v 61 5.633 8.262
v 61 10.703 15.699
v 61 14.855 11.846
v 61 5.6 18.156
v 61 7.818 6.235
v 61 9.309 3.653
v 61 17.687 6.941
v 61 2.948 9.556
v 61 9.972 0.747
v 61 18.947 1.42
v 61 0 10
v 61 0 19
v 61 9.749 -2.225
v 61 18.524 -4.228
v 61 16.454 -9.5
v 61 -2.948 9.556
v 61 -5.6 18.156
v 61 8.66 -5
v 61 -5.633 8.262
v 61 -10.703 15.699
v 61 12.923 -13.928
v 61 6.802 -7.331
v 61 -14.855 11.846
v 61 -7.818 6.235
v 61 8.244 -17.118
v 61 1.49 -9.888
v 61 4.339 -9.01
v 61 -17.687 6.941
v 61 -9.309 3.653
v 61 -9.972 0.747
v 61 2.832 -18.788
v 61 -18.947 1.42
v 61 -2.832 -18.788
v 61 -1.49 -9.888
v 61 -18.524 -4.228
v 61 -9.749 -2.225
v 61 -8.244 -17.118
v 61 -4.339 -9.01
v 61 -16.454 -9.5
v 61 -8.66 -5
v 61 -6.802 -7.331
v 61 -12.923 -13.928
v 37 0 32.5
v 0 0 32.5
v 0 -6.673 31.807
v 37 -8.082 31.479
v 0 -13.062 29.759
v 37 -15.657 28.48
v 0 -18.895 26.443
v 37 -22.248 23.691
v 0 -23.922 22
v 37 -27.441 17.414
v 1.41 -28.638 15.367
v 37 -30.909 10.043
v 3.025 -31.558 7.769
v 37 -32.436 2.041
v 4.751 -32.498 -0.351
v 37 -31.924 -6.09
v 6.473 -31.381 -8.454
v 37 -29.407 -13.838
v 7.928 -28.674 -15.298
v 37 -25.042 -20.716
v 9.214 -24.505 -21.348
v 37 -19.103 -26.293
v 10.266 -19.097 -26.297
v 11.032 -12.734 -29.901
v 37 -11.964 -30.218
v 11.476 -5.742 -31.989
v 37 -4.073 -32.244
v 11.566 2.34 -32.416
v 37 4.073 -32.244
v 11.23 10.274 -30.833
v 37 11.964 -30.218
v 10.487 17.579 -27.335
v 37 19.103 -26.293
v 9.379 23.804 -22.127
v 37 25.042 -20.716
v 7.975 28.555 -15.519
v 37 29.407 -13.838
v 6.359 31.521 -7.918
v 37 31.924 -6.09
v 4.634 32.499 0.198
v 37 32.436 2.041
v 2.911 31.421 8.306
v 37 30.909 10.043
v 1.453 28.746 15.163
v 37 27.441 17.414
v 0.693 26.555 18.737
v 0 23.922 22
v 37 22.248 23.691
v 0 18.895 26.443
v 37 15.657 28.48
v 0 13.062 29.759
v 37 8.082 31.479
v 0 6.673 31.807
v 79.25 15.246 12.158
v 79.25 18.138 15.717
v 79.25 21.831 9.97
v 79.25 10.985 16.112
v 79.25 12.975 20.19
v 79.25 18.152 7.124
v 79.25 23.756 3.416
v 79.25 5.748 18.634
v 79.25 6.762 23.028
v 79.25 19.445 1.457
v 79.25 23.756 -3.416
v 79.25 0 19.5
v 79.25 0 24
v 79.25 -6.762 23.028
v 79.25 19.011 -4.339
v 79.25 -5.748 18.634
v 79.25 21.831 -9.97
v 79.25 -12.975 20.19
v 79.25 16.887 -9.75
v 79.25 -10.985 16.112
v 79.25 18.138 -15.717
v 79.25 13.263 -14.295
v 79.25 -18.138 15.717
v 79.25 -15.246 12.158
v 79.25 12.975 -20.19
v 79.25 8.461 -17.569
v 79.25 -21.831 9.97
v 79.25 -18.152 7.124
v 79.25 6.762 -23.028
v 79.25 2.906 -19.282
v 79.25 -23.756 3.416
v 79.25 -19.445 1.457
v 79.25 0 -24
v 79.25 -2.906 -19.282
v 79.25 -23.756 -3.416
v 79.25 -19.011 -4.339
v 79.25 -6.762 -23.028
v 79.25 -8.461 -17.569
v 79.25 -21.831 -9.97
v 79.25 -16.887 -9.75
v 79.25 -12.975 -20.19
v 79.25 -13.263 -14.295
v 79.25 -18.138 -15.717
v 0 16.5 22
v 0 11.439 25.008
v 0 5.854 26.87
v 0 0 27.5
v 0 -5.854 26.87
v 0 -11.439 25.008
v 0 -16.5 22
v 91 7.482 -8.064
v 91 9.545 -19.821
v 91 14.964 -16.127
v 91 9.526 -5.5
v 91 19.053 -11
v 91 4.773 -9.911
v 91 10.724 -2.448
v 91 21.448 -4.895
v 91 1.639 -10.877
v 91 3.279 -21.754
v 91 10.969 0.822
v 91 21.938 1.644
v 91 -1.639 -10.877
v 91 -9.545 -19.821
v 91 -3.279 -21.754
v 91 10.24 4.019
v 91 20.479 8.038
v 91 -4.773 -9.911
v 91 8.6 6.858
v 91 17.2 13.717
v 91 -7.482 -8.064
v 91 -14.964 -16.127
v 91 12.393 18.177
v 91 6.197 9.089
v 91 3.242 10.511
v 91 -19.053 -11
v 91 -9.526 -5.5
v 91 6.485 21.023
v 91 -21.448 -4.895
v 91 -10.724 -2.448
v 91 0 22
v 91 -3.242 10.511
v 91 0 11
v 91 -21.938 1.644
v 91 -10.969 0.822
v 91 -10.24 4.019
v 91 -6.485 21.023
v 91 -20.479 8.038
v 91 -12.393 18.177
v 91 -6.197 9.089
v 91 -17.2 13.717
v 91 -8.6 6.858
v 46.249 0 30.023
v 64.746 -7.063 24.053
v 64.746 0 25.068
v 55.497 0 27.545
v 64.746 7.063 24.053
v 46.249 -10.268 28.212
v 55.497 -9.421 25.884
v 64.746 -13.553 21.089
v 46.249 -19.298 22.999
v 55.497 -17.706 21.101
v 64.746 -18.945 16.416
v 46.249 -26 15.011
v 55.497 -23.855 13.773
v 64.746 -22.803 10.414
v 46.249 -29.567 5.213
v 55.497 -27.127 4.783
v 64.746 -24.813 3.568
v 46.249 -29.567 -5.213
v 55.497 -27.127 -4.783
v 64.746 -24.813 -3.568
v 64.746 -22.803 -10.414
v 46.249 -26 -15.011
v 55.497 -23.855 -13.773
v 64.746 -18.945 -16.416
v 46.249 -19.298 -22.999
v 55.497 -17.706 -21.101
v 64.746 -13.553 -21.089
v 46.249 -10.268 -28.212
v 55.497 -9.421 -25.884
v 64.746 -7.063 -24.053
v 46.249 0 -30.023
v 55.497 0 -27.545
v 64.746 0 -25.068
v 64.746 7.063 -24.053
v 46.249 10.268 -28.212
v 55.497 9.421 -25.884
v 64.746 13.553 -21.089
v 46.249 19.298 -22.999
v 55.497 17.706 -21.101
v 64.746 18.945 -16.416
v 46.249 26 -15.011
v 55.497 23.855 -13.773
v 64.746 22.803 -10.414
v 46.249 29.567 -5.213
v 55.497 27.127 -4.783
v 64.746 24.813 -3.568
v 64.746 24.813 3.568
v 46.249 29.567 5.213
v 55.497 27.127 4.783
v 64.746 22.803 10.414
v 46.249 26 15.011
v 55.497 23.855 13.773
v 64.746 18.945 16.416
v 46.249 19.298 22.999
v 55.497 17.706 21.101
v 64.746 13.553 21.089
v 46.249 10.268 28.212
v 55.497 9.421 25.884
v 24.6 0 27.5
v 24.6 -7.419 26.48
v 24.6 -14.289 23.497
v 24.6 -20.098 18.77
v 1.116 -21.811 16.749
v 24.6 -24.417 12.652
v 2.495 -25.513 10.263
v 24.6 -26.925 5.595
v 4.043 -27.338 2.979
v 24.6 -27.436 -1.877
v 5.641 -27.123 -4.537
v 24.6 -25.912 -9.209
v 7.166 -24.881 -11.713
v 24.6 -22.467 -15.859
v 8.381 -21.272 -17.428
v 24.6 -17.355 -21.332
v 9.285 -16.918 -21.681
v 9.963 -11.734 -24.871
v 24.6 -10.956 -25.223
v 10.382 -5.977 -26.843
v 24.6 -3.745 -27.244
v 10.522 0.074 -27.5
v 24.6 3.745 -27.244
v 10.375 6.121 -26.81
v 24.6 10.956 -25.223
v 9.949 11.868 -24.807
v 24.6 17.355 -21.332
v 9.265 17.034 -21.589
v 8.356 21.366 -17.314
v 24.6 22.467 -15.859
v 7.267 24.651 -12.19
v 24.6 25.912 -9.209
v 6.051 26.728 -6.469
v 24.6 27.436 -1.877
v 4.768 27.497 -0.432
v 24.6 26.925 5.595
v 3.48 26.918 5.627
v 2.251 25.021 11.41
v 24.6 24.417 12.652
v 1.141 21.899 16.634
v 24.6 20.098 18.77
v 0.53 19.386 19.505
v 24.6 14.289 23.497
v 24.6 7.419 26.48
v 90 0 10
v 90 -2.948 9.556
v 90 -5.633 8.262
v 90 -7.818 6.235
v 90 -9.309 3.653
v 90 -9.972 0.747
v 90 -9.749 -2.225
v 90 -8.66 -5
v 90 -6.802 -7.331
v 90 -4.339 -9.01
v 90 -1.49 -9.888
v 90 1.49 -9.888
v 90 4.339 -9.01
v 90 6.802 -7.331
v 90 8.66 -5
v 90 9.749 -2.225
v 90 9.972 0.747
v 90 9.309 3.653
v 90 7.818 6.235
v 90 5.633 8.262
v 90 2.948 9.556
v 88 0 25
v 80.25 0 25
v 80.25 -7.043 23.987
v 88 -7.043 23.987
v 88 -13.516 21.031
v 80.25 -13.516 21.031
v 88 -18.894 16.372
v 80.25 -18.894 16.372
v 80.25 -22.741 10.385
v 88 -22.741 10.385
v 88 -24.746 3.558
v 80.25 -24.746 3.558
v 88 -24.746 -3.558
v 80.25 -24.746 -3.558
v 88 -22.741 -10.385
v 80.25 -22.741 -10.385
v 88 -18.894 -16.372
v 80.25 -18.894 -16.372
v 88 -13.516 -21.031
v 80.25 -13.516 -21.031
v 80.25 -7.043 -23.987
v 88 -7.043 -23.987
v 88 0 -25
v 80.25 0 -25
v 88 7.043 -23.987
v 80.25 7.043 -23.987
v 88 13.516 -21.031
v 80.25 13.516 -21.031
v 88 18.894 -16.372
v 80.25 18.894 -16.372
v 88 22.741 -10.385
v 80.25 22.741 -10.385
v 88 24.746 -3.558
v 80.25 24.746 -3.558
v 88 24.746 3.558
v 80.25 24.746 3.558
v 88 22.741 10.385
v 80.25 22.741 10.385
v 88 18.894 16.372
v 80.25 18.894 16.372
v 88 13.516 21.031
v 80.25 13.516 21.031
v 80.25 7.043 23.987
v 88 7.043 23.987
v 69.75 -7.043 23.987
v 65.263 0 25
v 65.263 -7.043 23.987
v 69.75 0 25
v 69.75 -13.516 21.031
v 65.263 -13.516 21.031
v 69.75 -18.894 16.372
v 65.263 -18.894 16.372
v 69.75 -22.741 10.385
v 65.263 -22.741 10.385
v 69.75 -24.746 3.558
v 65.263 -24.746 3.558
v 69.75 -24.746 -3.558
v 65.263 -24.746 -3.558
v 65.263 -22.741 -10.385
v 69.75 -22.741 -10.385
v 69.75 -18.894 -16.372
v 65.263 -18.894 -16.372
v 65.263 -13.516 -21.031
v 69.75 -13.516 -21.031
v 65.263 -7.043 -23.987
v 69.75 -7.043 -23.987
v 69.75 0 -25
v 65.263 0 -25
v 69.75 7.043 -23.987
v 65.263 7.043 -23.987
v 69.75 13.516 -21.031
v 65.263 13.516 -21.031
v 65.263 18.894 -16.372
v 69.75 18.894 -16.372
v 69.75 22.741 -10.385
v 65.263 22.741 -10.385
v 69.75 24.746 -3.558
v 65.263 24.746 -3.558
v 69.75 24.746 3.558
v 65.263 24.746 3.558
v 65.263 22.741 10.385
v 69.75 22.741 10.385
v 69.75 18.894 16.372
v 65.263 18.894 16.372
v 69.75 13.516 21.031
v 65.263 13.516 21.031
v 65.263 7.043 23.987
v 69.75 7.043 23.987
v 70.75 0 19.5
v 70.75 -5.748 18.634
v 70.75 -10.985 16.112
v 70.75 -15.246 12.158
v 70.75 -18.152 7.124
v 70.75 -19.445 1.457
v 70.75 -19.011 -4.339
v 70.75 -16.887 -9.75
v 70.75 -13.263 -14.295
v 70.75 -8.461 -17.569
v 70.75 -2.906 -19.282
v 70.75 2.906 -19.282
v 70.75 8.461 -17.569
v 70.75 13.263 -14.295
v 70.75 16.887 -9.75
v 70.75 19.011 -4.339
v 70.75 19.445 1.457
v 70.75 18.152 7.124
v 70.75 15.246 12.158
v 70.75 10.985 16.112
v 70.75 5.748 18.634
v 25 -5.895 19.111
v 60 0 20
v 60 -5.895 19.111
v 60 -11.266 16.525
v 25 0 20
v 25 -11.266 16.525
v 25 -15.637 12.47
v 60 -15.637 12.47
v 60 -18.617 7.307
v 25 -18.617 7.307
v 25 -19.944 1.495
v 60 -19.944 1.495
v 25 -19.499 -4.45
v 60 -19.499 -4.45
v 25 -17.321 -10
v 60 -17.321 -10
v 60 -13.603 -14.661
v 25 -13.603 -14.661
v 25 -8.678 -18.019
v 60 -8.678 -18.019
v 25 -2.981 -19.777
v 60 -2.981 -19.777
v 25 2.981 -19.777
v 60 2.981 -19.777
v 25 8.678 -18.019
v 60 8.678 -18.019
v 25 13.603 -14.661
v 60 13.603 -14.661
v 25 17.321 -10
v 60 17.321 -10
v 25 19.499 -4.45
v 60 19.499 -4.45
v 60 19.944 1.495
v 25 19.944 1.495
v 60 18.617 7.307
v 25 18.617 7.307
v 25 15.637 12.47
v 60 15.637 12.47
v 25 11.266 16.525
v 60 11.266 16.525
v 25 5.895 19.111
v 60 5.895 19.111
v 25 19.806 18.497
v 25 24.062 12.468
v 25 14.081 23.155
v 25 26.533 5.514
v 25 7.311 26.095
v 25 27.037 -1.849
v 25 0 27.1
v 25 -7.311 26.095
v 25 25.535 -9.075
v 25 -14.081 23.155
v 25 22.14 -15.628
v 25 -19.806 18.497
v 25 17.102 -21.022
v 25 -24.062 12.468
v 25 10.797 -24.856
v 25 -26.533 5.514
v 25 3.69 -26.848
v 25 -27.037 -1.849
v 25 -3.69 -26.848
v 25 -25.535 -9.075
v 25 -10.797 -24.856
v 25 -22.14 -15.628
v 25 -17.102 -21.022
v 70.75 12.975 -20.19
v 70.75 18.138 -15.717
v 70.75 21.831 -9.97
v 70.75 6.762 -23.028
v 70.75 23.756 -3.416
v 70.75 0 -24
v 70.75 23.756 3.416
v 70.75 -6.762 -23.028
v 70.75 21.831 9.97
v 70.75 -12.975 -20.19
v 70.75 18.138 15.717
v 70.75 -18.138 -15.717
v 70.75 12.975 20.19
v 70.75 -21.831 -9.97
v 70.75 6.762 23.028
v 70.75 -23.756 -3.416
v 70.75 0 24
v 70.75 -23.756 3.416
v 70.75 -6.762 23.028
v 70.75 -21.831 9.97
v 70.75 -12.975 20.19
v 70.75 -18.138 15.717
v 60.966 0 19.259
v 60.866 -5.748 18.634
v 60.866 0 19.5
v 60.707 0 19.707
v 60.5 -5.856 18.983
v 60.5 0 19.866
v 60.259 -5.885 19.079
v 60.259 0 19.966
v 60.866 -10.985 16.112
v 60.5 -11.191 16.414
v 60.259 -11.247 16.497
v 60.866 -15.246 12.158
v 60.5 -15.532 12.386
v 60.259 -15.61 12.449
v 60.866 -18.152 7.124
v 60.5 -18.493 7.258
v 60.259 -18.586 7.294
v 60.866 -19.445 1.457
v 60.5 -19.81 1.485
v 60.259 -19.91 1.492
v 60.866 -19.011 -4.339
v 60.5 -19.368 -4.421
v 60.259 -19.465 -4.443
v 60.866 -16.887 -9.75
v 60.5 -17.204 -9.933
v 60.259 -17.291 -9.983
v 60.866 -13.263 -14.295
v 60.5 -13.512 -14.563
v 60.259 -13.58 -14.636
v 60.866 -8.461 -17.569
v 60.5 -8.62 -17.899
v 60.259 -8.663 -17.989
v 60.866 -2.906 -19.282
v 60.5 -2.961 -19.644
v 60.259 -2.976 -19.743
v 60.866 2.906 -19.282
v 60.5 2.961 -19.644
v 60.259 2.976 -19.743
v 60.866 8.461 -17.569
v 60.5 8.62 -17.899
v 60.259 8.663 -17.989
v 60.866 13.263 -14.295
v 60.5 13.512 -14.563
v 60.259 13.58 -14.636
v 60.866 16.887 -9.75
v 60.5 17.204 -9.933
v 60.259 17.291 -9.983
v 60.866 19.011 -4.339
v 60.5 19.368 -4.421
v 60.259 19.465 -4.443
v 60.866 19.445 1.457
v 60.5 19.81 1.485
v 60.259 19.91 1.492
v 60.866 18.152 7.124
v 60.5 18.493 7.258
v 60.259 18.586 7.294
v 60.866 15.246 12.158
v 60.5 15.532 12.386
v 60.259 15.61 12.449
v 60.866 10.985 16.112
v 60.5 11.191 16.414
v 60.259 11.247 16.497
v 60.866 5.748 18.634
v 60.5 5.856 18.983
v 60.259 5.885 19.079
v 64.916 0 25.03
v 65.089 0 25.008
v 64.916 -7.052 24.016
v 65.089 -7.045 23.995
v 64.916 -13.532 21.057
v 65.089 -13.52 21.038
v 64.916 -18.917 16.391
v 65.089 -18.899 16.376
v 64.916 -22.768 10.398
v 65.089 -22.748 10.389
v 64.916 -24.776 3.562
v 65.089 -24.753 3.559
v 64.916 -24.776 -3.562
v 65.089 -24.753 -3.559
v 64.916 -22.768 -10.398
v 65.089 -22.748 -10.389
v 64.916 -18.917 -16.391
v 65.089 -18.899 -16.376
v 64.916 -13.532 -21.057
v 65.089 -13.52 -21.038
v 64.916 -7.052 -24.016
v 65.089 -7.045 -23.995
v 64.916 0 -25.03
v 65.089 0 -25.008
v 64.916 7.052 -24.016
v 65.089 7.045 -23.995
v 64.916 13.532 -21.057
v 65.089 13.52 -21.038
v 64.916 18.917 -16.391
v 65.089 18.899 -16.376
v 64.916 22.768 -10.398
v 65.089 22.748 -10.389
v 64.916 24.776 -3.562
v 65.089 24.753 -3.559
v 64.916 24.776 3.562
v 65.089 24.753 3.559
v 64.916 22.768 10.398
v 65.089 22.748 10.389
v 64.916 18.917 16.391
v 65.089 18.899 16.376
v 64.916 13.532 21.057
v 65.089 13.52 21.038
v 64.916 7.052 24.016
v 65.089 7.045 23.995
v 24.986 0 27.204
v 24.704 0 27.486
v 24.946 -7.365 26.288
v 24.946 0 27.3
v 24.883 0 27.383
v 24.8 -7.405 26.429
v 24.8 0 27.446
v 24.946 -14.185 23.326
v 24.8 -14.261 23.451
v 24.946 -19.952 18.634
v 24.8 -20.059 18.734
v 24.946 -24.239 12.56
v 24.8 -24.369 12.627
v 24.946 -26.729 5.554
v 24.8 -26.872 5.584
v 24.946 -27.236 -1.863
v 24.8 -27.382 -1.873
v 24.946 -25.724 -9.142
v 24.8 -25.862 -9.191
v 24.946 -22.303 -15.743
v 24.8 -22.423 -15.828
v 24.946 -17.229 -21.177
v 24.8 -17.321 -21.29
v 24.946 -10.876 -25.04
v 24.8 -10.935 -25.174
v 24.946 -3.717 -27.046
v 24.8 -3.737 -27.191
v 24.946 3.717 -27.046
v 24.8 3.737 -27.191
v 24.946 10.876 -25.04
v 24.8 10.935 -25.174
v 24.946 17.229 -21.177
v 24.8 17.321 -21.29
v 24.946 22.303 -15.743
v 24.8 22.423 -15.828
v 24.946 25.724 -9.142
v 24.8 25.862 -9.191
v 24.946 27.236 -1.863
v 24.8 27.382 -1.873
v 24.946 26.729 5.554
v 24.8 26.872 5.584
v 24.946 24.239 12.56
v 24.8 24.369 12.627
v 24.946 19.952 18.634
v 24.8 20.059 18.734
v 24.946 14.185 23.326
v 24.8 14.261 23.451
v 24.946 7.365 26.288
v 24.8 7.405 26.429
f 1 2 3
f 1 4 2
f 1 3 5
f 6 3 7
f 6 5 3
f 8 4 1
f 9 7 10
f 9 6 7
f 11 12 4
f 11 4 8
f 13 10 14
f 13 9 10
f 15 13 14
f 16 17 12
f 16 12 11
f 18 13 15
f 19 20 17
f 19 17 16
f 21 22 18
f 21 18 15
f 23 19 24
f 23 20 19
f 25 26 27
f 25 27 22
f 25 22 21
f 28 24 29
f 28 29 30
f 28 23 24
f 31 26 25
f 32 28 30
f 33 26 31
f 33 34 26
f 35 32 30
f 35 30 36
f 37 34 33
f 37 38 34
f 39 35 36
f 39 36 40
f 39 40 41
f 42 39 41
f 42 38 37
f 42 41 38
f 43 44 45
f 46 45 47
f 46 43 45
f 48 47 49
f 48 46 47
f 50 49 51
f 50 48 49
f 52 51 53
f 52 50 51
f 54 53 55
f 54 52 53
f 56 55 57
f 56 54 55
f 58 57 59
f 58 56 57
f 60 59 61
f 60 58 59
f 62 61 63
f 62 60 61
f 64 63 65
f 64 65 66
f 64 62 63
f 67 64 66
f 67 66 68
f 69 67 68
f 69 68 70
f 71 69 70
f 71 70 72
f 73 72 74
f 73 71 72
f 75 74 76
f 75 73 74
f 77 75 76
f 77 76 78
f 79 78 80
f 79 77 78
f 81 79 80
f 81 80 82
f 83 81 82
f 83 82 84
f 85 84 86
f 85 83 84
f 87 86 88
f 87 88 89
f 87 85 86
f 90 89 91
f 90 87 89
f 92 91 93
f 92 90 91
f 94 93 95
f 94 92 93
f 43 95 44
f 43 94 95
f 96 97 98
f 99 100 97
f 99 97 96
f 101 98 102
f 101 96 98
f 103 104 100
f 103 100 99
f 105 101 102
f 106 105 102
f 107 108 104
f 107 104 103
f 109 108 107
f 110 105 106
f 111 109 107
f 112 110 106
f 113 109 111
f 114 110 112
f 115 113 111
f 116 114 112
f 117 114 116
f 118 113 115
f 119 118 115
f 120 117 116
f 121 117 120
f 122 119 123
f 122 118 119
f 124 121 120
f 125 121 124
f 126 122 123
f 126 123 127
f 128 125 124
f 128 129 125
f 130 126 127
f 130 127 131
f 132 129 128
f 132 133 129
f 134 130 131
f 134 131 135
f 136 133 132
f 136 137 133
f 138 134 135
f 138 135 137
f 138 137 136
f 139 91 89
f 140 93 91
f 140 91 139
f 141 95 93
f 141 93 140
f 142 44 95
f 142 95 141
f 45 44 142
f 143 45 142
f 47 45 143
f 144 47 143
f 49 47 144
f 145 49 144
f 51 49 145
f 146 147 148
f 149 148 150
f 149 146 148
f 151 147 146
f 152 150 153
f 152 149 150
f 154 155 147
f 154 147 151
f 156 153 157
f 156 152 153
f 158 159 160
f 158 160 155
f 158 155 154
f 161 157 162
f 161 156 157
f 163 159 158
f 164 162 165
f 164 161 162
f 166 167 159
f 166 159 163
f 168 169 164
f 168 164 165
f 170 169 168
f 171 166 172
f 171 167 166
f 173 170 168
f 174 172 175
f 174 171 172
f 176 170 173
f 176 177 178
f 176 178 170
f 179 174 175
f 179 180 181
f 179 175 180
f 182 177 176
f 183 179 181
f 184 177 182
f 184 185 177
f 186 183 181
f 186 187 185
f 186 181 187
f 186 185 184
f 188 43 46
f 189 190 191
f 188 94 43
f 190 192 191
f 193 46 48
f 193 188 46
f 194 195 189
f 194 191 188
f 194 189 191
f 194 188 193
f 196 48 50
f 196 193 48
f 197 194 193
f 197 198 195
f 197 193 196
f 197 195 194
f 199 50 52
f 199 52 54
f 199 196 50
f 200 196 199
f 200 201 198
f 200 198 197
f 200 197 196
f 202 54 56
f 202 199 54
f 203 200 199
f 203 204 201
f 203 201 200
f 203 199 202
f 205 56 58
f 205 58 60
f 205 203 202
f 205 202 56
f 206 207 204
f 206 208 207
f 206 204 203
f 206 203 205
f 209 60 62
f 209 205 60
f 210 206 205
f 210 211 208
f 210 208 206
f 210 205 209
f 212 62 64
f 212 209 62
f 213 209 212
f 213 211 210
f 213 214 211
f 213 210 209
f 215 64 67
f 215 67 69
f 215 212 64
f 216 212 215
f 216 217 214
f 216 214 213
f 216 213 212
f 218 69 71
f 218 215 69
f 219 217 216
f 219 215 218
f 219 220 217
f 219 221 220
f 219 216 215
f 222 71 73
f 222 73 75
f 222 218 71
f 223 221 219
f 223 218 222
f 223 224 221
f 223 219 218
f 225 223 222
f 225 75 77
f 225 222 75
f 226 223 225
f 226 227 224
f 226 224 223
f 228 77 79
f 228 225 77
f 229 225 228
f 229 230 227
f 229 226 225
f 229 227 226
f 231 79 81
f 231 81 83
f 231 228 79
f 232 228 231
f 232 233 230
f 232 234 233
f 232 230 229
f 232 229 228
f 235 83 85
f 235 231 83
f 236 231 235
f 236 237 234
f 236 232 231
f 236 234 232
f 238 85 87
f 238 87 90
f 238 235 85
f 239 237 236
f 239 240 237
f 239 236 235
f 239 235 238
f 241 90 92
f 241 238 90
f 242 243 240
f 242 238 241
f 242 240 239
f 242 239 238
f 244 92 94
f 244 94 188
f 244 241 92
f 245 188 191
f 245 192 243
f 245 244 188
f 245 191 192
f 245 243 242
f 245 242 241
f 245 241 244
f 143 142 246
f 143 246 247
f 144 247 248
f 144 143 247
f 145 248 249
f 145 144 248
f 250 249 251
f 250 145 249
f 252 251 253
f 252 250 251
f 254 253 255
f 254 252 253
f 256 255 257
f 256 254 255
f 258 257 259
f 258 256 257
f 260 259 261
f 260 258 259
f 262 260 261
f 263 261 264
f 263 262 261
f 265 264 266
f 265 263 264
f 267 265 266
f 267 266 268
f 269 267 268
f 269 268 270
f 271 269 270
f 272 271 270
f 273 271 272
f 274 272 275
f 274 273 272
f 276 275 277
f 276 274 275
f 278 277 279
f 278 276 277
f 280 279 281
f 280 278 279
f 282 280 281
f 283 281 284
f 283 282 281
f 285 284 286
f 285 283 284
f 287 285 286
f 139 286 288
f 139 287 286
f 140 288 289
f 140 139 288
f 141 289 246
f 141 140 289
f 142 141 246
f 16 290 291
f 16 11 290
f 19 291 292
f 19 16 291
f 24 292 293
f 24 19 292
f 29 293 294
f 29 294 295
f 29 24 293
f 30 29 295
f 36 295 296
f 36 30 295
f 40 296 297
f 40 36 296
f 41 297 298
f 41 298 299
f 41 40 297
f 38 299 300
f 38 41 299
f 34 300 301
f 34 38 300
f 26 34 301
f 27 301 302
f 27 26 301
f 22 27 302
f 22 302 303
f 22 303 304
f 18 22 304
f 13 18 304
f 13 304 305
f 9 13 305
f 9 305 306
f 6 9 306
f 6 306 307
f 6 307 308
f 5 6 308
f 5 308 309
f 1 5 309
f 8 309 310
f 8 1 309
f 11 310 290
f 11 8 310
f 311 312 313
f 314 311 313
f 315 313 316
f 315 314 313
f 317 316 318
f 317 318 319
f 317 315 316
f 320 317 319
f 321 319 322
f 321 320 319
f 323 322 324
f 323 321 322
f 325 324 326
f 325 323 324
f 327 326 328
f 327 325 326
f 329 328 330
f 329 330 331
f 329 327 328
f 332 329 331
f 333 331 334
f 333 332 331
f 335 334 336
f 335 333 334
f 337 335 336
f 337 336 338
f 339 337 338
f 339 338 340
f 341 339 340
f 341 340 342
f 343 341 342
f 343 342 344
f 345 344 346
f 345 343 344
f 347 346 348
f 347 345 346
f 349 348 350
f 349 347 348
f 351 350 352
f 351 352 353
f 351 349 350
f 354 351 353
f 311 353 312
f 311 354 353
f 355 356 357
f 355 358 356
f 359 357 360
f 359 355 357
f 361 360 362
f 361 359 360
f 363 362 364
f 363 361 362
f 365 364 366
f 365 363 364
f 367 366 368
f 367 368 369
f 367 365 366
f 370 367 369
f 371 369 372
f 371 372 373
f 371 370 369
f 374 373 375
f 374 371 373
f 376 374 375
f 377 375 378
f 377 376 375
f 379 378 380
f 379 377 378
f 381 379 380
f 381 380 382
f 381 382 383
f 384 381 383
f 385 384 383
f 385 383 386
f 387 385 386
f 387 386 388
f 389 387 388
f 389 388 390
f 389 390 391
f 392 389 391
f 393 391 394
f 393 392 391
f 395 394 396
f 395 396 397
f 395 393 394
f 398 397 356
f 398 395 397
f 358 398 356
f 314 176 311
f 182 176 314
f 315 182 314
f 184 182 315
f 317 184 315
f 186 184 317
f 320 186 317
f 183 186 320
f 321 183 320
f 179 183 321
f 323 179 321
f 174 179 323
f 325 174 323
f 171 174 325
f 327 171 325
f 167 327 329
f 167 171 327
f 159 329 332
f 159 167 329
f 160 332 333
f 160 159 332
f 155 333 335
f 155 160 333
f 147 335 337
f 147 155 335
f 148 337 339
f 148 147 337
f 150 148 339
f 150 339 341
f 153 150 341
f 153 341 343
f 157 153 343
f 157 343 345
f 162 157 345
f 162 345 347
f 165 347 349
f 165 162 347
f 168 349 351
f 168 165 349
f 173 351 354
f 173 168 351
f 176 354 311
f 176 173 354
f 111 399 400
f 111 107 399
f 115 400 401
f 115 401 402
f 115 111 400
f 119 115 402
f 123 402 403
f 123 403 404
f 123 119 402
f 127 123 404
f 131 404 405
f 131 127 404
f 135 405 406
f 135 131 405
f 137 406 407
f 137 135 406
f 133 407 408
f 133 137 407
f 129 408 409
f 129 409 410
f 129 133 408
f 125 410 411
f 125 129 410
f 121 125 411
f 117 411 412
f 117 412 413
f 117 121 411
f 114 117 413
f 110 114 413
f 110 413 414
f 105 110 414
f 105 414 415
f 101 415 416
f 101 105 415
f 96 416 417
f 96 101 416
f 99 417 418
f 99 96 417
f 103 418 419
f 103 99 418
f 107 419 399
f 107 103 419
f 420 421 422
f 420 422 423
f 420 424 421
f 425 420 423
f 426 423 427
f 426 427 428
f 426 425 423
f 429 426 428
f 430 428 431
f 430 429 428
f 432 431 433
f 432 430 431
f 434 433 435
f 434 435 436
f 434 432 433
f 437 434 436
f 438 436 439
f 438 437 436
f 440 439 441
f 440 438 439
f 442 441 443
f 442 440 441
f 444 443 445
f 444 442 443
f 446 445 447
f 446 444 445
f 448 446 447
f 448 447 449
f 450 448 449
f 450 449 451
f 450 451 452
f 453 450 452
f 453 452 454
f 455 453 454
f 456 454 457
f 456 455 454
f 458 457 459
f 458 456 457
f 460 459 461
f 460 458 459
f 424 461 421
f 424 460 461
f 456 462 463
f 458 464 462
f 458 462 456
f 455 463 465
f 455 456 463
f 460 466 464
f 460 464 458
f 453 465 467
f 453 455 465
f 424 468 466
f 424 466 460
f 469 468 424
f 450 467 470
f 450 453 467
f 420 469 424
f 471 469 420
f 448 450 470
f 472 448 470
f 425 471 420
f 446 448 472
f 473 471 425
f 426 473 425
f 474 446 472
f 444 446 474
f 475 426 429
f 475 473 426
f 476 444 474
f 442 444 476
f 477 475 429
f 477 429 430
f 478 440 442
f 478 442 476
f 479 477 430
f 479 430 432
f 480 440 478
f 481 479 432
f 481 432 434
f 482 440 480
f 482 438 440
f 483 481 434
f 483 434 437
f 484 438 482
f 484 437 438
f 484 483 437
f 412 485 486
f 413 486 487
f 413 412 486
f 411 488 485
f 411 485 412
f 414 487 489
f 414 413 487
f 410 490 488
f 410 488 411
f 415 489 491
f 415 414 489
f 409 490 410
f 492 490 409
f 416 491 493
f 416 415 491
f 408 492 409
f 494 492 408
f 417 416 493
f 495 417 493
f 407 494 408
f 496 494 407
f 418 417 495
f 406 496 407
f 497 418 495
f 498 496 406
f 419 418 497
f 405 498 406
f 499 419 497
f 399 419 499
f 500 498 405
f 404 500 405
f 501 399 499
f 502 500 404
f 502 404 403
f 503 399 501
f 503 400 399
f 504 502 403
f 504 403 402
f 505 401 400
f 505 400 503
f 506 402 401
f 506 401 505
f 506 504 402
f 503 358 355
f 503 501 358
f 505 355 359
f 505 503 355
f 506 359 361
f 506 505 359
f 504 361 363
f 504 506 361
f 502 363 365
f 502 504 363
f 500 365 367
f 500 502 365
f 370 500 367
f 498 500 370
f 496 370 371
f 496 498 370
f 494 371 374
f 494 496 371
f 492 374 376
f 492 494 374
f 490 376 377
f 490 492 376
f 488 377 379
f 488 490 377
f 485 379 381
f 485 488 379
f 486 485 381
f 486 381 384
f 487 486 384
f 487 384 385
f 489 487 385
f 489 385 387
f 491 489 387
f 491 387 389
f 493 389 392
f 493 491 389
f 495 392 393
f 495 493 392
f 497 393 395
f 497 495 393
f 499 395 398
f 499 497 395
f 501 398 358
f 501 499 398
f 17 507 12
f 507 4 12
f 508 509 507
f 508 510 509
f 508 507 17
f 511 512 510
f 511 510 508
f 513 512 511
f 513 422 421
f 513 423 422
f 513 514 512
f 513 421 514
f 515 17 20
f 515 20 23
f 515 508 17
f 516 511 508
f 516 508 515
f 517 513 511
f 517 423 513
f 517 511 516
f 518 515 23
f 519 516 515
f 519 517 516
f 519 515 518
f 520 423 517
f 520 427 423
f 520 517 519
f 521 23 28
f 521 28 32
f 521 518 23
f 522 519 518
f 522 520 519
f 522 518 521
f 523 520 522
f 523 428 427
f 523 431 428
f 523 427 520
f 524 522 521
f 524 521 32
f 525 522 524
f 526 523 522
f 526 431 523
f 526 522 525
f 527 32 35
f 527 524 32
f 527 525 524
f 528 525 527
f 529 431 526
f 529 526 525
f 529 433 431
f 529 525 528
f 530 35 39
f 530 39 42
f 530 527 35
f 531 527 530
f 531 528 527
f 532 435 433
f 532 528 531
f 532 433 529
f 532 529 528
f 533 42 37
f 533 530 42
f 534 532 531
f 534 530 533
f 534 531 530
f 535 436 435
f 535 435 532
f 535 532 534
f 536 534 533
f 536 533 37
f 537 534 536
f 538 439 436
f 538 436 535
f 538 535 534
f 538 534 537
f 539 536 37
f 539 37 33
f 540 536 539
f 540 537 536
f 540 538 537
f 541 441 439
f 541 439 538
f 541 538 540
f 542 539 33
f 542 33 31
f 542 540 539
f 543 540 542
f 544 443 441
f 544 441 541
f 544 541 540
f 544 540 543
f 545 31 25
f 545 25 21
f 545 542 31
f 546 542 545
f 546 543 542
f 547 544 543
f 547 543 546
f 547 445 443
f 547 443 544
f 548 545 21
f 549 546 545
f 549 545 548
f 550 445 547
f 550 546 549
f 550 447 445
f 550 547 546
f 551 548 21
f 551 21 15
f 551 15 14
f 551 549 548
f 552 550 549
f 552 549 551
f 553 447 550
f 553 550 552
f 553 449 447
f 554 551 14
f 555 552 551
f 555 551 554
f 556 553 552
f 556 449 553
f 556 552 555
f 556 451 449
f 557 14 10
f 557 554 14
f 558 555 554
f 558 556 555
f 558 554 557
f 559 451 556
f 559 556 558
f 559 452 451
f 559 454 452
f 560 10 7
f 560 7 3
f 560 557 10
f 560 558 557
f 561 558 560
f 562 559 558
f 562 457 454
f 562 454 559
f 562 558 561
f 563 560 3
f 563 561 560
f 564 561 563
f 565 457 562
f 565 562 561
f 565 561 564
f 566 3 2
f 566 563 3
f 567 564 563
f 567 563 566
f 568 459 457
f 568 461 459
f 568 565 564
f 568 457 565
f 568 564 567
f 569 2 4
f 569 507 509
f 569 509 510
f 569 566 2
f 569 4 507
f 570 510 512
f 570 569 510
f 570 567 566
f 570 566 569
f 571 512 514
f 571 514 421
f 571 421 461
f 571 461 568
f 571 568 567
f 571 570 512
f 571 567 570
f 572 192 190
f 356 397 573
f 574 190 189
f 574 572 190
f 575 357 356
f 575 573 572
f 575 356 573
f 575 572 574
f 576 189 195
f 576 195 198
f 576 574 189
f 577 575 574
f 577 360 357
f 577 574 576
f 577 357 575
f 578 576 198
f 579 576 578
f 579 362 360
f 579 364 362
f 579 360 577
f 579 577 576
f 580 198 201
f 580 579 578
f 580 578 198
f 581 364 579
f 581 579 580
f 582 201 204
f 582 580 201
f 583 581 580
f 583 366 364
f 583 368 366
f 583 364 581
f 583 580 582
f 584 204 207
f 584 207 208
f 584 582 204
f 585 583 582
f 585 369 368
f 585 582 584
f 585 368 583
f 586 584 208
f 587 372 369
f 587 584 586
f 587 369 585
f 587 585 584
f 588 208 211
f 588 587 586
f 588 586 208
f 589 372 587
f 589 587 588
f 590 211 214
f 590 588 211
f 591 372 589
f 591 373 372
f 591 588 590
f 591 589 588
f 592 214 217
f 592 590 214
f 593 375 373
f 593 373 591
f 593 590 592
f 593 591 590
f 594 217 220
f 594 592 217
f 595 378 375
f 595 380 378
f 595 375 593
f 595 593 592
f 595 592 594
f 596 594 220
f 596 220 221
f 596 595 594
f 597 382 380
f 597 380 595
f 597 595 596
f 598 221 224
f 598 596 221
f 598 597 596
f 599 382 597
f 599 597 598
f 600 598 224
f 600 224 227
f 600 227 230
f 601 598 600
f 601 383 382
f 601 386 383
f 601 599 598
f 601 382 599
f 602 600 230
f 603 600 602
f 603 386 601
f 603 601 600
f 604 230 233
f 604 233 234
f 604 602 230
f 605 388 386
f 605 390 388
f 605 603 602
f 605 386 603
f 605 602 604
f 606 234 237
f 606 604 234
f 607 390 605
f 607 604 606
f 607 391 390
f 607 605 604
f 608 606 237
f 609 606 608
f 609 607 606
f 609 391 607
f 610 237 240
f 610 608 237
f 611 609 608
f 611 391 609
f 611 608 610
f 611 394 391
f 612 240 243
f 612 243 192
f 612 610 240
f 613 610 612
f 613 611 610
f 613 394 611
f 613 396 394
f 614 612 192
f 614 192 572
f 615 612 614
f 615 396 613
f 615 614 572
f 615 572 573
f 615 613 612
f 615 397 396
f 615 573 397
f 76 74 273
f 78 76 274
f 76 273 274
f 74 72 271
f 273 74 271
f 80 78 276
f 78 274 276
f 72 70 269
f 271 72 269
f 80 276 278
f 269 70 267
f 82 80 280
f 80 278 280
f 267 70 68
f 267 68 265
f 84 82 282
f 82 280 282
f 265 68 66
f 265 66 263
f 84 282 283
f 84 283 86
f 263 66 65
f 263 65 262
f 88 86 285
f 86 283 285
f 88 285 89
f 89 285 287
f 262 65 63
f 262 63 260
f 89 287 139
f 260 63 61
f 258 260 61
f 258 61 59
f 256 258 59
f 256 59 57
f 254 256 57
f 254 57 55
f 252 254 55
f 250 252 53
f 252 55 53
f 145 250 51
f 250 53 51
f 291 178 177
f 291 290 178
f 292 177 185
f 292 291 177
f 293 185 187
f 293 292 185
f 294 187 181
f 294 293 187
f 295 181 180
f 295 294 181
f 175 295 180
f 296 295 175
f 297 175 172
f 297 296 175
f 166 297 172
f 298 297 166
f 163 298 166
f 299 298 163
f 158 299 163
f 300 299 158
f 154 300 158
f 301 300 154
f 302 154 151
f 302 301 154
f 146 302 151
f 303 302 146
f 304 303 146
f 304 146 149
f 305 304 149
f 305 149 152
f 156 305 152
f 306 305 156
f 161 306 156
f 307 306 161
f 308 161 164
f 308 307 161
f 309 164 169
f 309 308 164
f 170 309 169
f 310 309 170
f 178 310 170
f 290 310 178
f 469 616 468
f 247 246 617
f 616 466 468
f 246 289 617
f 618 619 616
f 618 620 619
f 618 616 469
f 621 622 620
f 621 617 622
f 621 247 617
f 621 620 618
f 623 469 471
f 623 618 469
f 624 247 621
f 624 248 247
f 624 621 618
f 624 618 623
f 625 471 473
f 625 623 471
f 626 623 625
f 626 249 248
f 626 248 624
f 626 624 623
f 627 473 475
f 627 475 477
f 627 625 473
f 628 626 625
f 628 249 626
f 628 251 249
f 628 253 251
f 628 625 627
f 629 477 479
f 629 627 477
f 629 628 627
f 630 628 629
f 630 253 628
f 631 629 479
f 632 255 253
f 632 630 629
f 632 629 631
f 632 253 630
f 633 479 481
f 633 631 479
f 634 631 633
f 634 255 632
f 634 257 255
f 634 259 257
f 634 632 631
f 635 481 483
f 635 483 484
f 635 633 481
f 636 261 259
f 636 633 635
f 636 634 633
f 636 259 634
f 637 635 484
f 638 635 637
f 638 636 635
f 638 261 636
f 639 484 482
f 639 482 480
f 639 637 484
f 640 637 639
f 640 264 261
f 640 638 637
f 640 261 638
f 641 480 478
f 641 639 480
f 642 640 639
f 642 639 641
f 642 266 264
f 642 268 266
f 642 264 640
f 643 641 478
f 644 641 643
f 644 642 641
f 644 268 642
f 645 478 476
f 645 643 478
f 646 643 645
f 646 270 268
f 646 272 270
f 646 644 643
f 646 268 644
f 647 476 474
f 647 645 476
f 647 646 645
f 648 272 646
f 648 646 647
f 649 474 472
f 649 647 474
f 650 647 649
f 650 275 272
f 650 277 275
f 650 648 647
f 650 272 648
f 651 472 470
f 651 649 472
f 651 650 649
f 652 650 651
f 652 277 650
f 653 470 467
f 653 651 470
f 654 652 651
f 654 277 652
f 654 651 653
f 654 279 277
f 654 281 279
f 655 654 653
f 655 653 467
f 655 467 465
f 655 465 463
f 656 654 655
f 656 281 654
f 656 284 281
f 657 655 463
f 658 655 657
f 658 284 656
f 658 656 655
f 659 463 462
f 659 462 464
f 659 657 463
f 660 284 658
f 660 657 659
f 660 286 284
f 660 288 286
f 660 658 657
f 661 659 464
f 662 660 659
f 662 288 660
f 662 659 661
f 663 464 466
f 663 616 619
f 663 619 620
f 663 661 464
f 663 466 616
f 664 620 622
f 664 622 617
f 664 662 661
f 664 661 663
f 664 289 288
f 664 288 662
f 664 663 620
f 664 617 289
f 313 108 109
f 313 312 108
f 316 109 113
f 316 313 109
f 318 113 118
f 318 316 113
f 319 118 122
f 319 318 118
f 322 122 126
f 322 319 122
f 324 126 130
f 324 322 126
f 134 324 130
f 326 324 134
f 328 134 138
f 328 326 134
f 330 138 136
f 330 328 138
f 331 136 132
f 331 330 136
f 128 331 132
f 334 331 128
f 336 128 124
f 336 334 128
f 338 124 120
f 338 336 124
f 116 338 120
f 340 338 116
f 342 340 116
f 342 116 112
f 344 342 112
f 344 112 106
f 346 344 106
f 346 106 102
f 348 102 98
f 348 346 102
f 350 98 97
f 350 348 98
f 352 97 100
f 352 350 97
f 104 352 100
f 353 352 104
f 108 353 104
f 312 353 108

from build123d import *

# Parameters (mm, degrees)
CUT_EXTRUDE_12_DEPTH      = 102.948516419
CUT_EXTRUDE_12_DEPTH_BACK = 102.948516419


with BuildPart() as part:
    # Эскиз1 → Revolve 236 (revolve)
    with BuildSketch(Plane.XY, mode=Mode.PRIVATE) as revolve_236_sk:
        with BuildLine():
            Line((0, 32.5), (37, 32.5))
            Line((37, 32.5), (64.745695, 25.068113))
            ThreePointArc((64.745695, 25.068113), (65.002224223, 25.017098236), (65.263217049, 24.999995817))
            Line((65.263217049, 24.999995817), (69.749999449, 24.999995817))
            Line((69.749999449, 24.999995817), (70.749999449, 23.999995817))
            Line((70.749999449, 23.999995817), (70.749999449, 19.499995817))
            Line((70.749999449, 19.499995817), (79.25, 19.499995817))
            Line((79.25, 19.499995817), (79.25, 24))
            Line((79.25, 24), (80.25, 25))
            Line((80.25, 25), (88, 25))
            Line((88, 25), (91, 22))
            Line((91, 22), (91, 11))
            Line((91, 11), (90, 10))
            Line((90, 10), (61, 10))
            Line((61, 10), (61, 19))
            ThreePointArc((61, 19), (60.707106781, 19.707106781), (60, 20))
            Line((60, 20), (25, 20))
            Line((25, 20), (25, 27.1))
            ThreePointArc((25, 27.1), (24.882842712, 27.382842712), (24.6, 27.5))
            Line((24.6, 27.5), (0, 27.5))
            Line((0, 27.5), (0, 32.5))
        make_face()
    revolve(revolve_236_sk.sketch.rotate(Axis((0, 0, 0), (1, 0, 0)), 90), axis=Axis((0, 0, 0), (1, 0, 0)))

    # Эскиз2 → Наклон торца 12 градусов (cut, two sides: drawn at the far end of the back side and taken through both)
    with BuildSketch(Plane(origin=(0, 0, 0), x_dir=(1, 0, 0), z_dir=(0, 1, 0)).offset(-CUT_EXTRUDE_12_DEPTH_BACK)):
        Polygon((-25, 50), (15.30407244, 50), (-5.951583727, -50), (-25, -50), align=None)
    extrude(amount=CUT_EXTRUDE_12_DEPTH + CUT_EXTRUDE_12_DEPTH_BACK, mode=Mode.SUBTRACT)


solid = part.part
